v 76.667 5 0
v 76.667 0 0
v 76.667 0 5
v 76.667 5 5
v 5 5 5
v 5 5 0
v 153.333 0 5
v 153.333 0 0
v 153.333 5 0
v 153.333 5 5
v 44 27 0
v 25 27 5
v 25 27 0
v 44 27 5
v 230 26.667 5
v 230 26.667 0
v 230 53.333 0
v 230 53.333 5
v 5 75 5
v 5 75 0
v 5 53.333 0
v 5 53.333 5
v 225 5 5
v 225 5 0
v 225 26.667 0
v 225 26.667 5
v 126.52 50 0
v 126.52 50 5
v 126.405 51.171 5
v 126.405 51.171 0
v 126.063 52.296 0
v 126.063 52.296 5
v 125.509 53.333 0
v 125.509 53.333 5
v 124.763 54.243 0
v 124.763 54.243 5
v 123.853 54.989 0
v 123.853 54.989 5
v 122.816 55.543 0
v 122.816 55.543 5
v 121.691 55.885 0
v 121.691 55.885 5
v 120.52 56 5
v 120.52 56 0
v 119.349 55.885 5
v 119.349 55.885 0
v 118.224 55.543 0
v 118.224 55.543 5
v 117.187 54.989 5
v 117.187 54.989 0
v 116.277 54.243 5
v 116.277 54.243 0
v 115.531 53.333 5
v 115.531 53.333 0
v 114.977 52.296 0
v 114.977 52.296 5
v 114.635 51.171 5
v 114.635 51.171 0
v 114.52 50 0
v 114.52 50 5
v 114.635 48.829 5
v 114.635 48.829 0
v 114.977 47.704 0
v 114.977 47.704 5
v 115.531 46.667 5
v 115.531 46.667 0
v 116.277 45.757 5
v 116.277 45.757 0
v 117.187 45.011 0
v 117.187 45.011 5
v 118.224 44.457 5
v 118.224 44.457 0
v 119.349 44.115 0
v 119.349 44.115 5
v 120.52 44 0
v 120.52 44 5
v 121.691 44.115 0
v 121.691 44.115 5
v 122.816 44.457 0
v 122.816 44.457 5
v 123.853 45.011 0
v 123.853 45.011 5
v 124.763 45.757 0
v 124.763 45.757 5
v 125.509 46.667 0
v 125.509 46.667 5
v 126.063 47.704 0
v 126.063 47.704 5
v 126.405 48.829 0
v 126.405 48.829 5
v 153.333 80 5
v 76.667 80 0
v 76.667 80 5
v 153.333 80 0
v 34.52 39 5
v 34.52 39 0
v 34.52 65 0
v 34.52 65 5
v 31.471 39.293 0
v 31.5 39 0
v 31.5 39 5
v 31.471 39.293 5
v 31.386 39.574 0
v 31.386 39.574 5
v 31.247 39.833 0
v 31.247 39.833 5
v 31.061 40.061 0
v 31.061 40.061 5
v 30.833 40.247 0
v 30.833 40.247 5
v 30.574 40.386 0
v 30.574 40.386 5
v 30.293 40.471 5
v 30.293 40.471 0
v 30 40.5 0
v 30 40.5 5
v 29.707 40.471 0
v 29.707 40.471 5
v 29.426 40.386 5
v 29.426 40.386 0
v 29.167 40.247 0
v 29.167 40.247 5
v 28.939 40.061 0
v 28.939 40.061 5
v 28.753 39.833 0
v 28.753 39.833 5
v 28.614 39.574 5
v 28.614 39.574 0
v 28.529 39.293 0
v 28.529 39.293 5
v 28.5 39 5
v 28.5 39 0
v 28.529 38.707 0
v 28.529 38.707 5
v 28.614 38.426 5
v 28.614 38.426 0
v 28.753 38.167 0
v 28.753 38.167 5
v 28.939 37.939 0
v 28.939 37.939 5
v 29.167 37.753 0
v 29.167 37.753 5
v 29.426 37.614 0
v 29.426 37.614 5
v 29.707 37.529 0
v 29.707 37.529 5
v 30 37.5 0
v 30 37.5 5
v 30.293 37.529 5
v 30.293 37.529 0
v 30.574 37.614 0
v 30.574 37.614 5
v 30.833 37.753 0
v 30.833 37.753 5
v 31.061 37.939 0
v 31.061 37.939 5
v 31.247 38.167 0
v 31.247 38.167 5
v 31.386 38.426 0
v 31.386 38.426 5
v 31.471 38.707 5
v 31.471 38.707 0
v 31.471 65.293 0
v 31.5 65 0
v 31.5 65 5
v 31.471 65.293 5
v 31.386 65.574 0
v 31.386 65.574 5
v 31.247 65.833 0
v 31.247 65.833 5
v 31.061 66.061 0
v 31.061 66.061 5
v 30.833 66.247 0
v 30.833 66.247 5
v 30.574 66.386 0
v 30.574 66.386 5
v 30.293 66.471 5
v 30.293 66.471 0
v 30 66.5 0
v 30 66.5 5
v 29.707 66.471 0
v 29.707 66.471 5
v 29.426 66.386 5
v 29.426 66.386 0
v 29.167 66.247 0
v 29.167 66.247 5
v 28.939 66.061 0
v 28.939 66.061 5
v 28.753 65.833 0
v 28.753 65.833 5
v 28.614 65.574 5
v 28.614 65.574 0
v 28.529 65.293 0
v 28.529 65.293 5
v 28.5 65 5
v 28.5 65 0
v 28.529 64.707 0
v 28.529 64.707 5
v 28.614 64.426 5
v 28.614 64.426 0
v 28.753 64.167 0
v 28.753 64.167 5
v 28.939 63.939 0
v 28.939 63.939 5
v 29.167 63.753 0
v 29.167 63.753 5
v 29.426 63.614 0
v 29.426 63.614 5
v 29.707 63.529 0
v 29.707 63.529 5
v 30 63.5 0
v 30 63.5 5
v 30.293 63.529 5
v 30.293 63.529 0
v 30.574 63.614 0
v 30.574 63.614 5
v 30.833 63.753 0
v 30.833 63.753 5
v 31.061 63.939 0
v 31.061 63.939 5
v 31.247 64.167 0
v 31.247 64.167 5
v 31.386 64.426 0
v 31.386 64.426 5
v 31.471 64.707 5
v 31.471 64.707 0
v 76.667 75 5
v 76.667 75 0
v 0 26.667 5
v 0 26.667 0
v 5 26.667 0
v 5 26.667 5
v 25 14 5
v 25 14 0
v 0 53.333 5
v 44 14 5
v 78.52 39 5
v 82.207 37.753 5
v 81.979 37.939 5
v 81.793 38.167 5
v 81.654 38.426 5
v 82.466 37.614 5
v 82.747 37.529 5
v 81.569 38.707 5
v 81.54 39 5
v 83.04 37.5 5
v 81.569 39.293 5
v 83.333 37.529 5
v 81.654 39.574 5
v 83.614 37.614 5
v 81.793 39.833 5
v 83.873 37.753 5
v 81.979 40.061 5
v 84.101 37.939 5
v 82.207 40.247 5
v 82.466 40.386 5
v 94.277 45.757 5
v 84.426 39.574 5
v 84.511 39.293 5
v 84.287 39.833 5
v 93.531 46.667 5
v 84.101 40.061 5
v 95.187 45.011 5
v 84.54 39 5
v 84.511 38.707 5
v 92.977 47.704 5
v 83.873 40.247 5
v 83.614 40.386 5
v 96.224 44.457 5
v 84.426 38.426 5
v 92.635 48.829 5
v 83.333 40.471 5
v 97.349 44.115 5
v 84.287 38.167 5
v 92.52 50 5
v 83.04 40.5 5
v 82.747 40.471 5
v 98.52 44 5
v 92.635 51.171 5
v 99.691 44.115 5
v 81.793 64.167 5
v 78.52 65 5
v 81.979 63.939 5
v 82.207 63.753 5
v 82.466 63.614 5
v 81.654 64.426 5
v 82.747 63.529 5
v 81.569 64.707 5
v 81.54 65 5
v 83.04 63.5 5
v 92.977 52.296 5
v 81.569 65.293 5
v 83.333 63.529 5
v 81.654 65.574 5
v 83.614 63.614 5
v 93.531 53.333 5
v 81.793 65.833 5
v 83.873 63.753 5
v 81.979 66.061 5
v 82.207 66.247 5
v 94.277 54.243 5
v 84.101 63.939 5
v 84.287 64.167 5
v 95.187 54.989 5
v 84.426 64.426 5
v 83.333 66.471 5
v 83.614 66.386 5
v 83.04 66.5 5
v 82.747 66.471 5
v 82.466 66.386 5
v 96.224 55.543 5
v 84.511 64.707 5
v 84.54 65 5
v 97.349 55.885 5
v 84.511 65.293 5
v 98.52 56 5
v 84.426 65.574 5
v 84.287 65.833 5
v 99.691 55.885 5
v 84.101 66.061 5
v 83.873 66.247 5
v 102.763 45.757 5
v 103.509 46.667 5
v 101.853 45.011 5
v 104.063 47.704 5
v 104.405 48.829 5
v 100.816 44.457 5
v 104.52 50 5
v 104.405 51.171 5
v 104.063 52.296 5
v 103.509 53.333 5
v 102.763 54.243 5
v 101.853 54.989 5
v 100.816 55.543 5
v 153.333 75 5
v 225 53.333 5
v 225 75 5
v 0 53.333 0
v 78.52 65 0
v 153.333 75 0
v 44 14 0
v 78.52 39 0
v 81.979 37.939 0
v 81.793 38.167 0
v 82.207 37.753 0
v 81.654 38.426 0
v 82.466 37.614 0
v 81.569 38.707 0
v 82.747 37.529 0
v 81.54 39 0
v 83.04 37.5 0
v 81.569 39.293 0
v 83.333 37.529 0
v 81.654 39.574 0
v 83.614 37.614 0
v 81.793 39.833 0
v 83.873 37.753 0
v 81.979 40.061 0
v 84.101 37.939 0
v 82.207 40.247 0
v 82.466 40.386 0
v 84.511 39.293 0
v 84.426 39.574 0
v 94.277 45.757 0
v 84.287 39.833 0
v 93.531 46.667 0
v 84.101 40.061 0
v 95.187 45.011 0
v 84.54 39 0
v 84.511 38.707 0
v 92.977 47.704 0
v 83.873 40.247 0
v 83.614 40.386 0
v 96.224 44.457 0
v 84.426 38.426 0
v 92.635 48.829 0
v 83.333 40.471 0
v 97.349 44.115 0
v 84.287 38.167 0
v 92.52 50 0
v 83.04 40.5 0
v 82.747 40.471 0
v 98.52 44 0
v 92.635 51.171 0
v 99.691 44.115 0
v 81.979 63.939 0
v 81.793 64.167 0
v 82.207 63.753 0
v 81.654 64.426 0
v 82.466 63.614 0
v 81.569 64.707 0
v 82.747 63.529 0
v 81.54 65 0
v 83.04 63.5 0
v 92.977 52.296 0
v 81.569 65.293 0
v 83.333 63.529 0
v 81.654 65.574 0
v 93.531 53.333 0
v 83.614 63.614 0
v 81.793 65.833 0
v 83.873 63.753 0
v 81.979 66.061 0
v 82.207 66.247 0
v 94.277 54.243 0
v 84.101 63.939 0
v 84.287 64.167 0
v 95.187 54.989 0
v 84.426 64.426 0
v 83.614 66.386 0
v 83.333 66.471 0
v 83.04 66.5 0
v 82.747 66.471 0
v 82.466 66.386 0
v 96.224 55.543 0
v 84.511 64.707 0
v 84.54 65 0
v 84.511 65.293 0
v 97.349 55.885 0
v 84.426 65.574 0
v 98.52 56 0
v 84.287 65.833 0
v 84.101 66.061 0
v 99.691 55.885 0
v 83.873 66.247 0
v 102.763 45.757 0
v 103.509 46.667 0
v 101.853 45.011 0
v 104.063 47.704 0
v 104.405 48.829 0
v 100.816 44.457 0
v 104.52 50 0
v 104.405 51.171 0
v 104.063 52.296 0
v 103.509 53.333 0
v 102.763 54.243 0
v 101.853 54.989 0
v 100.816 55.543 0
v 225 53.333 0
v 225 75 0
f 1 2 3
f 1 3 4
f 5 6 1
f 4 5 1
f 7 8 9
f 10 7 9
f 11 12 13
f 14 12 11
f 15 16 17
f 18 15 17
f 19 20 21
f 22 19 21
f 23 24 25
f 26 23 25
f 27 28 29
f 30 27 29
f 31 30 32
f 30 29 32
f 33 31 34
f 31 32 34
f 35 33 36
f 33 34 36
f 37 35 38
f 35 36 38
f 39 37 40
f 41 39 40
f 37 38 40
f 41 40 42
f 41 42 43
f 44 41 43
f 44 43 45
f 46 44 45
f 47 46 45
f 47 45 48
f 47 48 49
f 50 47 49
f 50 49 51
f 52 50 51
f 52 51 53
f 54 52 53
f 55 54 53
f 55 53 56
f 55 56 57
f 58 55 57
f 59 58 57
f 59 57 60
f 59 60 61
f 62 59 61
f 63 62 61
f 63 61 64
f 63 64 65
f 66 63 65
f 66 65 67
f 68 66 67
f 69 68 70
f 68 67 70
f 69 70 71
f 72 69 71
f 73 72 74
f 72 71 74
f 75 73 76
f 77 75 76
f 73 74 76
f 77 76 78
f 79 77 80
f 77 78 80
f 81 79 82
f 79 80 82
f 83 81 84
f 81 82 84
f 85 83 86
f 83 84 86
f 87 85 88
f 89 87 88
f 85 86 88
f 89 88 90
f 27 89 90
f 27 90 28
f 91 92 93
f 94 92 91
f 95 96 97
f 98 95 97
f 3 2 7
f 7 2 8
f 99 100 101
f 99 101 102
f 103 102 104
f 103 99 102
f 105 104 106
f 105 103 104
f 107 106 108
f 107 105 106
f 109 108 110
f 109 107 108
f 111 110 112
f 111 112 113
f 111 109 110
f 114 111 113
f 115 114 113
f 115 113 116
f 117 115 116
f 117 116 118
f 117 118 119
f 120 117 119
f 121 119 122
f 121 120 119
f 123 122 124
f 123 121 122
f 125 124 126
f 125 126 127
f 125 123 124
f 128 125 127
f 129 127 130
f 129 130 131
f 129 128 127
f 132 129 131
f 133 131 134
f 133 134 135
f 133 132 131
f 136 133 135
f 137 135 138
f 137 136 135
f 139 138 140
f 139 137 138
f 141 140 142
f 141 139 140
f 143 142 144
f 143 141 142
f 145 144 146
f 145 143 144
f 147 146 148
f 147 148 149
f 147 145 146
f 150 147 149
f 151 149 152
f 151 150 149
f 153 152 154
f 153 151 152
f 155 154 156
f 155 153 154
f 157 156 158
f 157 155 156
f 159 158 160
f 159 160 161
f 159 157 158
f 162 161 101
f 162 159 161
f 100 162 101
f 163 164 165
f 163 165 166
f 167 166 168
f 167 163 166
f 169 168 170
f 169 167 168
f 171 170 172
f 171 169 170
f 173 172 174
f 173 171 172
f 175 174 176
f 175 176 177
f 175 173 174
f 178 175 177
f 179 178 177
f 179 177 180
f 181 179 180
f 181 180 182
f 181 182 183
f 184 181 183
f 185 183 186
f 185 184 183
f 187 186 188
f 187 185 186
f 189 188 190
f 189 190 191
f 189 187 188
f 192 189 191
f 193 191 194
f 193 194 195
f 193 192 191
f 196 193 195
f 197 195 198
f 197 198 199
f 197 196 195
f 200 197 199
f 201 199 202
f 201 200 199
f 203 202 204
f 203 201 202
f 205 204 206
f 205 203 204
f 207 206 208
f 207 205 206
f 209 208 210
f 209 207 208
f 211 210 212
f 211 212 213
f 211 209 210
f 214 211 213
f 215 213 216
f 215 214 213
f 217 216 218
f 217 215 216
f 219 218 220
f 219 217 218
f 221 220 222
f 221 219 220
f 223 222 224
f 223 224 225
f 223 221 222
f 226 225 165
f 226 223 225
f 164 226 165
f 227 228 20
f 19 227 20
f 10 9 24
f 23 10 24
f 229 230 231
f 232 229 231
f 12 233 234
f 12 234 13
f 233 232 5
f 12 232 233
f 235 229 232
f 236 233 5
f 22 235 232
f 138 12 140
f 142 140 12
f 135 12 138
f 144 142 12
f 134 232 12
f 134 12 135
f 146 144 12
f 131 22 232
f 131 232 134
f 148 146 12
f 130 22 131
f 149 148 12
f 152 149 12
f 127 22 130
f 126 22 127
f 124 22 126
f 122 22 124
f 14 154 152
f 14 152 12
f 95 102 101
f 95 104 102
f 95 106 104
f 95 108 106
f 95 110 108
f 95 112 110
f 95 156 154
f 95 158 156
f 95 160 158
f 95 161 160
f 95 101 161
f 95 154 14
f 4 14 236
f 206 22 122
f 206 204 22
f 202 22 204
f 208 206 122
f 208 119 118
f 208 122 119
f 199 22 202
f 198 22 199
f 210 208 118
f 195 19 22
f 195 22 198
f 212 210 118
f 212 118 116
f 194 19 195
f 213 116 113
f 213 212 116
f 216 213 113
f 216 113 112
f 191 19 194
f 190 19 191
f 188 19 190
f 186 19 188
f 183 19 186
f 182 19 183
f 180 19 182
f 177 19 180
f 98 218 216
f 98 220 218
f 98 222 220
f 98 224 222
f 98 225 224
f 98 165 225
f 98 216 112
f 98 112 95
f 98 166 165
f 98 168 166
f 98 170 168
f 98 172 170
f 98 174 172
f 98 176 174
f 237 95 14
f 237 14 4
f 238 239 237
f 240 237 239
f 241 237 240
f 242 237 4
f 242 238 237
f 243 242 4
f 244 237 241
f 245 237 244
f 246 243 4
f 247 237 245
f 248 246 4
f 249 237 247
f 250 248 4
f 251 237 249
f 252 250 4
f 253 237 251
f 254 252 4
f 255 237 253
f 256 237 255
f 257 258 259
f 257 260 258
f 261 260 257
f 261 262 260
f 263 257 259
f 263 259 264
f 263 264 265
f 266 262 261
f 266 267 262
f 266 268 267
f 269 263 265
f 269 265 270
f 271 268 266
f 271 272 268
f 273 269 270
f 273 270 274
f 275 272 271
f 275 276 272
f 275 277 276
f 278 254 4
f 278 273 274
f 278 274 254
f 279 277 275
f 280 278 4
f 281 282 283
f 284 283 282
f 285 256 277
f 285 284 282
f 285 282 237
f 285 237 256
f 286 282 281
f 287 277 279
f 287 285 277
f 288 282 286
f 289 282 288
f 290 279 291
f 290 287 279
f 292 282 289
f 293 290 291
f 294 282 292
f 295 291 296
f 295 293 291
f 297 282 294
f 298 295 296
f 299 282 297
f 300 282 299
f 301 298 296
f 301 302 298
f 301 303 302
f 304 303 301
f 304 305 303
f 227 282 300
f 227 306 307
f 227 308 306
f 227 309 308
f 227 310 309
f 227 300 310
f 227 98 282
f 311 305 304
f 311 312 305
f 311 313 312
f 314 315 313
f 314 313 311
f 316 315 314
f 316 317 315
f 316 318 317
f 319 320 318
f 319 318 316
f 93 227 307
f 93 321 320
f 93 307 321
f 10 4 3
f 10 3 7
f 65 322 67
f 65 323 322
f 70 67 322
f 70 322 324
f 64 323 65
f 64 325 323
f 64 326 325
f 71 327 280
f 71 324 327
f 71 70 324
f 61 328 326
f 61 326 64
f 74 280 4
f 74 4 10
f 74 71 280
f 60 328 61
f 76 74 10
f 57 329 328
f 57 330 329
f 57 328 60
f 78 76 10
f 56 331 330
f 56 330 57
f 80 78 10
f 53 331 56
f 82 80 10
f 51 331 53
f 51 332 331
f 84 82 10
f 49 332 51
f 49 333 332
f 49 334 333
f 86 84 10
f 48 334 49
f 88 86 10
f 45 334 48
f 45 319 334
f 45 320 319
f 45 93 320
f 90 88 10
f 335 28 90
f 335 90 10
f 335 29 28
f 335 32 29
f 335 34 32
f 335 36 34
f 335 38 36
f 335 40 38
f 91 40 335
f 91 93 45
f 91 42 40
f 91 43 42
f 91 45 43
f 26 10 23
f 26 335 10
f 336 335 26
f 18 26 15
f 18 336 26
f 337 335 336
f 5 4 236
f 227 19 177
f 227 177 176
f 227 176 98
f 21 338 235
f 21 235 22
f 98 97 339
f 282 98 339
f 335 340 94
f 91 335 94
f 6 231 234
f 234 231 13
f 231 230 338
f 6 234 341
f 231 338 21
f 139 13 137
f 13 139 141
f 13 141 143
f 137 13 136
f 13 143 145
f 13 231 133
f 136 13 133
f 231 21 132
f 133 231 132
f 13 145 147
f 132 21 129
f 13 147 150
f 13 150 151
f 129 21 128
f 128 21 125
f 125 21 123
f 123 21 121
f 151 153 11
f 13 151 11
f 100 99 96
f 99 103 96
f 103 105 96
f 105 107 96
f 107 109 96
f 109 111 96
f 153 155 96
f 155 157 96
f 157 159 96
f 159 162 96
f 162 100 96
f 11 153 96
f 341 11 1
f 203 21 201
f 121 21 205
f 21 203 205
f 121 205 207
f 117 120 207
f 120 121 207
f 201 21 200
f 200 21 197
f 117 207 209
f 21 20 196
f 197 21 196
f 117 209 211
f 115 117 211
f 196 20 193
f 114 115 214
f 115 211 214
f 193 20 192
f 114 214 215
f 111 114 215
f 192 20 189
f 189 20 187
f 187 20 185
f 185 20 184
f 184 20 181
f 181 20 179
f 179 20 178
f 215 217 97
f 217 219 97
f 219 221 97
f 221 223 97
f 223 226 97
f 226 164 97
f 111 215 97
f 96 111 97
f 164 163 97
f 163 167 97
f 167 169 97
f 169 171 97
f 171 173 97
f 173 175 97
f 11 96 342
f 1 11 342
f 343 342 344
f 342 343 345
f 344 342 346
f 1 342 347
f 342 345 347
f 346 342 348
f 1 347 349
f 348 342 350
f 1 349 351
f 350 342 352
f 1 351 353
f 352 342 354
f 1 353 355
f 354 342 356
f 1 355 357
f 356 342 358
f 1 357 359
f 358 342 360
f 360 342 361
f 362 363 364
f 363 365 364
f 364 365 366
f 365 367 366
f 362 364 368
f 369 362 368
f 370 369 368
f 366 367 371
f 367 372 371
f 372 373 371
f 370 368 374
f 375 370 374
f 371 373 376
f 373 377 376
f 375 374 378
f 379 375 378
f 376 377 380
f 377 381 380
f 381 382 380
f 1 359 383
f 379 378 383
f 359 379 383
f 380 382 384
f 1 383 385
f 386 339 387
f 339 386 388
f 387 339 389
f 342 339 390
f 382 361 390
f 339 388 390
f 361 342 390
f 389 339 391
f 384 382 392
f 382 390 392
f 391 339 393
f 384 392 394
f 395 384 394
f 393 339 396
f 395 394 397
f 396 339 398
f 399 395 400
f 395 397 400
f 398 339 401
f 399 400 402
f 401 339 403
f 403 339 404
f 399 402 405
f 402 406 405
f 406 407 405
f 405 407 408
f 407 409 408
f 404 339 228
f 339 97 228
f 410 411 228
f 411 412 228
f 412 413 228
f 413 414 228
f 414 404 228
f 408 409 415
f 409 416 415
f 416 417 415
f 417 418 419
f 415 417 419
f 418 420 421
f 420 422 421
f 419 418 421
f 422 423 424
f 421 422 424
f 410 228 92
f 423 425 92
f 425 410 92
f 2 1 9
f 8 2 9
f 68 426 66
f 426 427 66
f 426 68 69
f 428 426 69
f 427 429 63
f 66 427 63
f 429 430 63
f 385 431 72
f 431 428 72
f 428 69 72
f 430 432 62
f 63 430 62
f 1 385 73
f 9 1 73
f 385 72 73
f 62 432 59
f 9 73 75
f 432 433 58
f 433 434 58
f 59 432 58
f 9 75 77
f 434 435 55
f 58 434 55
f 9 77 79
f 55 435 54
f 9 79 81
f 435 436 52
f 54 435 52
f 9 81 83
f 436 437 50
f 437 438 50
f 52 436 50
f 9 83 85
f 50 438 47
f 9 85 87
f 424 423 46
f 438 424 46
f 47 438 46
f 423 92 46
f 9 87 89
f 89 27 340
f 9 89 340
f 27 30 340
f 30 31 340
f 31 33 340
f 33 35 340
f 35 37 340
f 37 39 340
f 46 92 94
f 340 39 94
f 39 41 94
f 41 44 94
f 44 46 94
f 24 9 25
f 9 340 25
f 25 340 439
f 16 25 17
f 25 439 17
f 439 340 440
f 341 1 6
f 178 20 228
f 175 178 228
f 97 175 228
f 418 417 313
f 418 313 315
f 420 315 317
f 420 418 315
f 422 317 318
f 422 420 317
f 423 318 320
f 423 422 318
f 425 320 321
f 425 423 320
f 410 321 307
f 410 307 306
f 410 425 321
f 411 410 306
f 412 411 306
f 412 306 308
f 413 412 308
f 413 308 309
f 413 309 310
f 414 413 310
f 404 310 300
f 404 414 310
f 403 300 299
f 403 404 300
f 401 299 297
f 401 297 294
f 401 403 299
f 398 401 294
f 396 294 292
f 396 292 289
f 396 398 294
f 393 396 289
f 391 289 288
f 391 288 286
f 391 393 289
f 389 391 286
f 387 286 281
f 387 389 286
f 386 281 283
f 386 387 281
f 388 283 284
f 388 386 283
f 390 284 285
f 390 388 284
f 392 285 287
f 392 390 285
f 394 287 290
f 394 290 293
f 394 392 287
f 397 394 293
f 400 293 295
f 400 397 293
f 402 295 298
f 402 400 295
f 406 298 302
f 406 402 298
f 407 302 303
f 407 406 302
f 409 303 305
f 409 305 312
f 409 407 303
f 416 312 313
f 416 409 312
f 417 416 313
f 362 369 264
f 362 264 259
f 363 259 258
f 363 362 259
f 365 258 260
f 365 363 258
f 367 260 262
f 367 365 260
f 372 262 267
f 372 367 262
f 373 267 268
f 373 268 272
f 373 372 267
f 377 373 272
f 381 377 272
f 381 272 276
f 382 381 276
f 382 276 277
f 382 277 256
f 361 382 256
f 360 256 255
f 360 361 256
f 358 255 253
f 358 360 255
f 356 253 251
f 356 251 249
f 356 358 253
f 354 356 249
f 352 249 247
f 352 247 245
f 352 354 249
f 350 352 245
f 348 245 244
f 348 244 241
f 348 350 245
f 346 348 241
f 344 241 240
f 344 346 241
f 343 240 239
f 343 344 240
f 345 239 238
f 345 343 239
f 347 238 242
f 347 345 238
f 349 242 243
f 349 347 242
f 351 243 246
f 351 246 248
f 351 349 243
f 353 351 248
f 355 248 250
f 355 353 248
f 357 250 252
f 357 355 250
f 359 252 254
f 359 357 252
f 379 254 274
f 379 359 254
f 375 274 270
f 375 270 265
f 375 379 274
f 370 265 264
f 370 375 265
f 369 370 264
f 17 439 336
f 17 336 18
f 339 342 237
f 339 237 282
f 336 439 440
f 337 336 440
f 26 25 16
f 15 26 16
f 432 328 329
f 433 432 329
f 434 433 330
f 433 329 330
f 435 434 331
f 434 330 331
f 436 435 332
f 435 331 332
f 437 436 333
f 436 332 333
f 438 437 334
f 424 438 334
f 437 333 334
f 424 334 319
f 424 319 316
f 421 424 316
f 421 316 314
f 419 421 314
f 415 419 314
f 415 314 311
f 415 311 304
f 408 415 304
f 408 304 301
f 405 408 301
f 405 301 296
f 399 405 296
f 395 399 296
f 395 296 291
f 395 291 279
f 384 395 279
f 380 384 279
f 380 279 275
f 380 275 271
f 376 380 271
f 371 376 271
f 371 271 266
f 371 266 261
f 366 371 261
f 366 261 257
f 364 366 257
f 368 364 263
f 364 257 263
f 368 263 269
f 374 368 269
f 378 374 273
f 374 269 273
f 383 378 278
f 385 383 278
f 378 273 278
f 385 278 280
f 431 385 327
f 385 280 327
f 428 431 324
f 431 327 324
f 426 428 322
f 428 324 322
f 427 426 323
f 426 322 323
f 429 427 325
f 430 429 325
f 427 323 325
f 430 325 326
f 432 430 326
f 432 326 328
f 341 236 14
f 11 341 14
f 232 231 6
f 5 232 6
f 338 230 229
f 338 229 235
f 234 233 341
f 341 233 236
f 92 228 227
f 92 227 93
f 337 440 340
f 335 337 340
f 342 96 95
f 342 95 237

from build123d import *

# Parameters (mm, degrees)
CROQUIS1_R              = 1.5
CROQUIS1_W              = 44
CROQUIS1_H              = 26
CROQUIS1_W_2            = 5
CROQUIS1_H_2            = 26.666666666
CROQUIS1_W_3            = 76.666666666
CROQUIS1_H_3            = 5
SALIENTE_EXTRUIR1_DEPTH = 5
CROQUIS2_R              = 4.15
CORTAR_EXTRUIR1_DEPTH   = 10
CROQUIS3_W              = 19
CROQUIS3_H              = 13
CORTAR_EXTRUIR2_DEPTH   = 10
CROQUIS4_R              = 4.15
CORTAR_EXTRUIR3_DEPTH   = 10
CROQUIS5_R              = 6
CORTAR_EXTRUIR4_DEPTH   = 10
CROQUIS7_W              = 87.958060954
CROQUIS7_H              = 14.714173765
SALIENTE_EXTRUIR2_DEPTH = 5


with BuildPart() as part:
    # Croquis1 → Saliente-Extruir1 (new body)
    with BuildSketch(Plane.XY):
        Polygon((5, 26.666666667), (5, 5), (76.666666667, 5), (153.333333333, 5), (225, 5), (225, 26.666666667), (225, 53.333333333), (225, 75), (153.333333333, 75), (76.666666667, 75), (5, 75), (5, 53.333333333), align=None)
        with Locations((30, 39)):
            Circle(CROQUIS1_R, mode=Mode.SUBTRACT)
        with Locations((83.04, 39)):
            Circle(CROQUIS1_R, mode=Mode.SUBTRACT)
        with Locations((56.52, 52)):
            Rectangle(CROQUIS1_W, CROQUIS1_H, mode=Mode.SUBTRACT)
        with Locations((30, 65)):
            Circle(CROQUIS1_R, mode=Mode.SUBTRACT)
        with Locations((83.04, 65)):
            Circle(CROQUIS1_R, mode=Mode.SUBTRACT)
        with Locations((227.5, 40)):
            Rectangle(CROQUIS1_W_2, CROQUIS1_H_2)
        with Locations((115, 2.5)):
            Rectangle(CROQUIS1_W_3, CROQUIS1_H_3)
        with Locations((2.5, 40)):
            Rectangle(CROQUIS1_W_2, CROQUIS1_H_2)
        with Locations((115, 77.5)):
            Rectangle(CROQUIS1_W_3, CROQUIS1_H_3)
    extrude(amount=SALIENTE_EXTRUIR1_DEPTH)

    # Croquis2 → Cortar-Extruir1 (cut)
    with BuildSketch(Plane.XY.offset(5)):
        with Locations((96.666666667, 20)):
            Circle(CROQUIS2_R)
        with Locations((116.666666667, 20)):
            Circle(CROQUIS2_R)
        with Locations((136.666666667, 20)):
            Circle(CROQUIS2_R)
    extrude(amount=-CORTAR_EXTRUIR1_DEPTH, mode=Mode.SUBTRACT)

    # Croquis3 → Cortar-Extruir2 (cut)
    with BuildSketch(Plane.XY.offset(5)):
        with Locations((34.5, 20.5)):
            Rectangle(CROQUIS3_W, CROQUIS3_H)
    extrude(amount=-CORTAR_EXTRUIR2_DEPTH, mode=Mode.SUBTRACT)

    # Croquis4 → Cortar-Extruir3 (cut)
    with BuildSketch(Plane.XY.offset(5)):
        with Locations((65, 20)):
            Circle(CROQUIS4_R)
        with Locations((80, 20)):
            Circle(CROQUIS4_R)
    extrude(amount=-CORTAR_EXTRUIR3_DEPTH, mode=Mode.SUBTRACT)

    # Croquis5 → Cortar-Extruir4 (cut)
    with BuildSketch(Plane.XY.offset(5)):
        with Locations((98.52, 50)):
            Circle(CROQUIS5_R)
        with Locations((120.52, 50)):
            Circle(CROQUIS5_R)
    extrude(amount=-CORTAR_EXTRUIR4_DEPTH, mode=Mode.SUBTRACT)

    # Croquis7 → Saliente-Extruir2 (add)
    with BuildSketch(Plane.XY.offset(5)):
        with Locations((100.697748768, 19.971943706)):
            Rectangle(CROQUIS7_W, CROQUIS7_H)
    extrude(amount=-SALIENTE_EXTRUIR2_DEPTH)


solid = part.part
